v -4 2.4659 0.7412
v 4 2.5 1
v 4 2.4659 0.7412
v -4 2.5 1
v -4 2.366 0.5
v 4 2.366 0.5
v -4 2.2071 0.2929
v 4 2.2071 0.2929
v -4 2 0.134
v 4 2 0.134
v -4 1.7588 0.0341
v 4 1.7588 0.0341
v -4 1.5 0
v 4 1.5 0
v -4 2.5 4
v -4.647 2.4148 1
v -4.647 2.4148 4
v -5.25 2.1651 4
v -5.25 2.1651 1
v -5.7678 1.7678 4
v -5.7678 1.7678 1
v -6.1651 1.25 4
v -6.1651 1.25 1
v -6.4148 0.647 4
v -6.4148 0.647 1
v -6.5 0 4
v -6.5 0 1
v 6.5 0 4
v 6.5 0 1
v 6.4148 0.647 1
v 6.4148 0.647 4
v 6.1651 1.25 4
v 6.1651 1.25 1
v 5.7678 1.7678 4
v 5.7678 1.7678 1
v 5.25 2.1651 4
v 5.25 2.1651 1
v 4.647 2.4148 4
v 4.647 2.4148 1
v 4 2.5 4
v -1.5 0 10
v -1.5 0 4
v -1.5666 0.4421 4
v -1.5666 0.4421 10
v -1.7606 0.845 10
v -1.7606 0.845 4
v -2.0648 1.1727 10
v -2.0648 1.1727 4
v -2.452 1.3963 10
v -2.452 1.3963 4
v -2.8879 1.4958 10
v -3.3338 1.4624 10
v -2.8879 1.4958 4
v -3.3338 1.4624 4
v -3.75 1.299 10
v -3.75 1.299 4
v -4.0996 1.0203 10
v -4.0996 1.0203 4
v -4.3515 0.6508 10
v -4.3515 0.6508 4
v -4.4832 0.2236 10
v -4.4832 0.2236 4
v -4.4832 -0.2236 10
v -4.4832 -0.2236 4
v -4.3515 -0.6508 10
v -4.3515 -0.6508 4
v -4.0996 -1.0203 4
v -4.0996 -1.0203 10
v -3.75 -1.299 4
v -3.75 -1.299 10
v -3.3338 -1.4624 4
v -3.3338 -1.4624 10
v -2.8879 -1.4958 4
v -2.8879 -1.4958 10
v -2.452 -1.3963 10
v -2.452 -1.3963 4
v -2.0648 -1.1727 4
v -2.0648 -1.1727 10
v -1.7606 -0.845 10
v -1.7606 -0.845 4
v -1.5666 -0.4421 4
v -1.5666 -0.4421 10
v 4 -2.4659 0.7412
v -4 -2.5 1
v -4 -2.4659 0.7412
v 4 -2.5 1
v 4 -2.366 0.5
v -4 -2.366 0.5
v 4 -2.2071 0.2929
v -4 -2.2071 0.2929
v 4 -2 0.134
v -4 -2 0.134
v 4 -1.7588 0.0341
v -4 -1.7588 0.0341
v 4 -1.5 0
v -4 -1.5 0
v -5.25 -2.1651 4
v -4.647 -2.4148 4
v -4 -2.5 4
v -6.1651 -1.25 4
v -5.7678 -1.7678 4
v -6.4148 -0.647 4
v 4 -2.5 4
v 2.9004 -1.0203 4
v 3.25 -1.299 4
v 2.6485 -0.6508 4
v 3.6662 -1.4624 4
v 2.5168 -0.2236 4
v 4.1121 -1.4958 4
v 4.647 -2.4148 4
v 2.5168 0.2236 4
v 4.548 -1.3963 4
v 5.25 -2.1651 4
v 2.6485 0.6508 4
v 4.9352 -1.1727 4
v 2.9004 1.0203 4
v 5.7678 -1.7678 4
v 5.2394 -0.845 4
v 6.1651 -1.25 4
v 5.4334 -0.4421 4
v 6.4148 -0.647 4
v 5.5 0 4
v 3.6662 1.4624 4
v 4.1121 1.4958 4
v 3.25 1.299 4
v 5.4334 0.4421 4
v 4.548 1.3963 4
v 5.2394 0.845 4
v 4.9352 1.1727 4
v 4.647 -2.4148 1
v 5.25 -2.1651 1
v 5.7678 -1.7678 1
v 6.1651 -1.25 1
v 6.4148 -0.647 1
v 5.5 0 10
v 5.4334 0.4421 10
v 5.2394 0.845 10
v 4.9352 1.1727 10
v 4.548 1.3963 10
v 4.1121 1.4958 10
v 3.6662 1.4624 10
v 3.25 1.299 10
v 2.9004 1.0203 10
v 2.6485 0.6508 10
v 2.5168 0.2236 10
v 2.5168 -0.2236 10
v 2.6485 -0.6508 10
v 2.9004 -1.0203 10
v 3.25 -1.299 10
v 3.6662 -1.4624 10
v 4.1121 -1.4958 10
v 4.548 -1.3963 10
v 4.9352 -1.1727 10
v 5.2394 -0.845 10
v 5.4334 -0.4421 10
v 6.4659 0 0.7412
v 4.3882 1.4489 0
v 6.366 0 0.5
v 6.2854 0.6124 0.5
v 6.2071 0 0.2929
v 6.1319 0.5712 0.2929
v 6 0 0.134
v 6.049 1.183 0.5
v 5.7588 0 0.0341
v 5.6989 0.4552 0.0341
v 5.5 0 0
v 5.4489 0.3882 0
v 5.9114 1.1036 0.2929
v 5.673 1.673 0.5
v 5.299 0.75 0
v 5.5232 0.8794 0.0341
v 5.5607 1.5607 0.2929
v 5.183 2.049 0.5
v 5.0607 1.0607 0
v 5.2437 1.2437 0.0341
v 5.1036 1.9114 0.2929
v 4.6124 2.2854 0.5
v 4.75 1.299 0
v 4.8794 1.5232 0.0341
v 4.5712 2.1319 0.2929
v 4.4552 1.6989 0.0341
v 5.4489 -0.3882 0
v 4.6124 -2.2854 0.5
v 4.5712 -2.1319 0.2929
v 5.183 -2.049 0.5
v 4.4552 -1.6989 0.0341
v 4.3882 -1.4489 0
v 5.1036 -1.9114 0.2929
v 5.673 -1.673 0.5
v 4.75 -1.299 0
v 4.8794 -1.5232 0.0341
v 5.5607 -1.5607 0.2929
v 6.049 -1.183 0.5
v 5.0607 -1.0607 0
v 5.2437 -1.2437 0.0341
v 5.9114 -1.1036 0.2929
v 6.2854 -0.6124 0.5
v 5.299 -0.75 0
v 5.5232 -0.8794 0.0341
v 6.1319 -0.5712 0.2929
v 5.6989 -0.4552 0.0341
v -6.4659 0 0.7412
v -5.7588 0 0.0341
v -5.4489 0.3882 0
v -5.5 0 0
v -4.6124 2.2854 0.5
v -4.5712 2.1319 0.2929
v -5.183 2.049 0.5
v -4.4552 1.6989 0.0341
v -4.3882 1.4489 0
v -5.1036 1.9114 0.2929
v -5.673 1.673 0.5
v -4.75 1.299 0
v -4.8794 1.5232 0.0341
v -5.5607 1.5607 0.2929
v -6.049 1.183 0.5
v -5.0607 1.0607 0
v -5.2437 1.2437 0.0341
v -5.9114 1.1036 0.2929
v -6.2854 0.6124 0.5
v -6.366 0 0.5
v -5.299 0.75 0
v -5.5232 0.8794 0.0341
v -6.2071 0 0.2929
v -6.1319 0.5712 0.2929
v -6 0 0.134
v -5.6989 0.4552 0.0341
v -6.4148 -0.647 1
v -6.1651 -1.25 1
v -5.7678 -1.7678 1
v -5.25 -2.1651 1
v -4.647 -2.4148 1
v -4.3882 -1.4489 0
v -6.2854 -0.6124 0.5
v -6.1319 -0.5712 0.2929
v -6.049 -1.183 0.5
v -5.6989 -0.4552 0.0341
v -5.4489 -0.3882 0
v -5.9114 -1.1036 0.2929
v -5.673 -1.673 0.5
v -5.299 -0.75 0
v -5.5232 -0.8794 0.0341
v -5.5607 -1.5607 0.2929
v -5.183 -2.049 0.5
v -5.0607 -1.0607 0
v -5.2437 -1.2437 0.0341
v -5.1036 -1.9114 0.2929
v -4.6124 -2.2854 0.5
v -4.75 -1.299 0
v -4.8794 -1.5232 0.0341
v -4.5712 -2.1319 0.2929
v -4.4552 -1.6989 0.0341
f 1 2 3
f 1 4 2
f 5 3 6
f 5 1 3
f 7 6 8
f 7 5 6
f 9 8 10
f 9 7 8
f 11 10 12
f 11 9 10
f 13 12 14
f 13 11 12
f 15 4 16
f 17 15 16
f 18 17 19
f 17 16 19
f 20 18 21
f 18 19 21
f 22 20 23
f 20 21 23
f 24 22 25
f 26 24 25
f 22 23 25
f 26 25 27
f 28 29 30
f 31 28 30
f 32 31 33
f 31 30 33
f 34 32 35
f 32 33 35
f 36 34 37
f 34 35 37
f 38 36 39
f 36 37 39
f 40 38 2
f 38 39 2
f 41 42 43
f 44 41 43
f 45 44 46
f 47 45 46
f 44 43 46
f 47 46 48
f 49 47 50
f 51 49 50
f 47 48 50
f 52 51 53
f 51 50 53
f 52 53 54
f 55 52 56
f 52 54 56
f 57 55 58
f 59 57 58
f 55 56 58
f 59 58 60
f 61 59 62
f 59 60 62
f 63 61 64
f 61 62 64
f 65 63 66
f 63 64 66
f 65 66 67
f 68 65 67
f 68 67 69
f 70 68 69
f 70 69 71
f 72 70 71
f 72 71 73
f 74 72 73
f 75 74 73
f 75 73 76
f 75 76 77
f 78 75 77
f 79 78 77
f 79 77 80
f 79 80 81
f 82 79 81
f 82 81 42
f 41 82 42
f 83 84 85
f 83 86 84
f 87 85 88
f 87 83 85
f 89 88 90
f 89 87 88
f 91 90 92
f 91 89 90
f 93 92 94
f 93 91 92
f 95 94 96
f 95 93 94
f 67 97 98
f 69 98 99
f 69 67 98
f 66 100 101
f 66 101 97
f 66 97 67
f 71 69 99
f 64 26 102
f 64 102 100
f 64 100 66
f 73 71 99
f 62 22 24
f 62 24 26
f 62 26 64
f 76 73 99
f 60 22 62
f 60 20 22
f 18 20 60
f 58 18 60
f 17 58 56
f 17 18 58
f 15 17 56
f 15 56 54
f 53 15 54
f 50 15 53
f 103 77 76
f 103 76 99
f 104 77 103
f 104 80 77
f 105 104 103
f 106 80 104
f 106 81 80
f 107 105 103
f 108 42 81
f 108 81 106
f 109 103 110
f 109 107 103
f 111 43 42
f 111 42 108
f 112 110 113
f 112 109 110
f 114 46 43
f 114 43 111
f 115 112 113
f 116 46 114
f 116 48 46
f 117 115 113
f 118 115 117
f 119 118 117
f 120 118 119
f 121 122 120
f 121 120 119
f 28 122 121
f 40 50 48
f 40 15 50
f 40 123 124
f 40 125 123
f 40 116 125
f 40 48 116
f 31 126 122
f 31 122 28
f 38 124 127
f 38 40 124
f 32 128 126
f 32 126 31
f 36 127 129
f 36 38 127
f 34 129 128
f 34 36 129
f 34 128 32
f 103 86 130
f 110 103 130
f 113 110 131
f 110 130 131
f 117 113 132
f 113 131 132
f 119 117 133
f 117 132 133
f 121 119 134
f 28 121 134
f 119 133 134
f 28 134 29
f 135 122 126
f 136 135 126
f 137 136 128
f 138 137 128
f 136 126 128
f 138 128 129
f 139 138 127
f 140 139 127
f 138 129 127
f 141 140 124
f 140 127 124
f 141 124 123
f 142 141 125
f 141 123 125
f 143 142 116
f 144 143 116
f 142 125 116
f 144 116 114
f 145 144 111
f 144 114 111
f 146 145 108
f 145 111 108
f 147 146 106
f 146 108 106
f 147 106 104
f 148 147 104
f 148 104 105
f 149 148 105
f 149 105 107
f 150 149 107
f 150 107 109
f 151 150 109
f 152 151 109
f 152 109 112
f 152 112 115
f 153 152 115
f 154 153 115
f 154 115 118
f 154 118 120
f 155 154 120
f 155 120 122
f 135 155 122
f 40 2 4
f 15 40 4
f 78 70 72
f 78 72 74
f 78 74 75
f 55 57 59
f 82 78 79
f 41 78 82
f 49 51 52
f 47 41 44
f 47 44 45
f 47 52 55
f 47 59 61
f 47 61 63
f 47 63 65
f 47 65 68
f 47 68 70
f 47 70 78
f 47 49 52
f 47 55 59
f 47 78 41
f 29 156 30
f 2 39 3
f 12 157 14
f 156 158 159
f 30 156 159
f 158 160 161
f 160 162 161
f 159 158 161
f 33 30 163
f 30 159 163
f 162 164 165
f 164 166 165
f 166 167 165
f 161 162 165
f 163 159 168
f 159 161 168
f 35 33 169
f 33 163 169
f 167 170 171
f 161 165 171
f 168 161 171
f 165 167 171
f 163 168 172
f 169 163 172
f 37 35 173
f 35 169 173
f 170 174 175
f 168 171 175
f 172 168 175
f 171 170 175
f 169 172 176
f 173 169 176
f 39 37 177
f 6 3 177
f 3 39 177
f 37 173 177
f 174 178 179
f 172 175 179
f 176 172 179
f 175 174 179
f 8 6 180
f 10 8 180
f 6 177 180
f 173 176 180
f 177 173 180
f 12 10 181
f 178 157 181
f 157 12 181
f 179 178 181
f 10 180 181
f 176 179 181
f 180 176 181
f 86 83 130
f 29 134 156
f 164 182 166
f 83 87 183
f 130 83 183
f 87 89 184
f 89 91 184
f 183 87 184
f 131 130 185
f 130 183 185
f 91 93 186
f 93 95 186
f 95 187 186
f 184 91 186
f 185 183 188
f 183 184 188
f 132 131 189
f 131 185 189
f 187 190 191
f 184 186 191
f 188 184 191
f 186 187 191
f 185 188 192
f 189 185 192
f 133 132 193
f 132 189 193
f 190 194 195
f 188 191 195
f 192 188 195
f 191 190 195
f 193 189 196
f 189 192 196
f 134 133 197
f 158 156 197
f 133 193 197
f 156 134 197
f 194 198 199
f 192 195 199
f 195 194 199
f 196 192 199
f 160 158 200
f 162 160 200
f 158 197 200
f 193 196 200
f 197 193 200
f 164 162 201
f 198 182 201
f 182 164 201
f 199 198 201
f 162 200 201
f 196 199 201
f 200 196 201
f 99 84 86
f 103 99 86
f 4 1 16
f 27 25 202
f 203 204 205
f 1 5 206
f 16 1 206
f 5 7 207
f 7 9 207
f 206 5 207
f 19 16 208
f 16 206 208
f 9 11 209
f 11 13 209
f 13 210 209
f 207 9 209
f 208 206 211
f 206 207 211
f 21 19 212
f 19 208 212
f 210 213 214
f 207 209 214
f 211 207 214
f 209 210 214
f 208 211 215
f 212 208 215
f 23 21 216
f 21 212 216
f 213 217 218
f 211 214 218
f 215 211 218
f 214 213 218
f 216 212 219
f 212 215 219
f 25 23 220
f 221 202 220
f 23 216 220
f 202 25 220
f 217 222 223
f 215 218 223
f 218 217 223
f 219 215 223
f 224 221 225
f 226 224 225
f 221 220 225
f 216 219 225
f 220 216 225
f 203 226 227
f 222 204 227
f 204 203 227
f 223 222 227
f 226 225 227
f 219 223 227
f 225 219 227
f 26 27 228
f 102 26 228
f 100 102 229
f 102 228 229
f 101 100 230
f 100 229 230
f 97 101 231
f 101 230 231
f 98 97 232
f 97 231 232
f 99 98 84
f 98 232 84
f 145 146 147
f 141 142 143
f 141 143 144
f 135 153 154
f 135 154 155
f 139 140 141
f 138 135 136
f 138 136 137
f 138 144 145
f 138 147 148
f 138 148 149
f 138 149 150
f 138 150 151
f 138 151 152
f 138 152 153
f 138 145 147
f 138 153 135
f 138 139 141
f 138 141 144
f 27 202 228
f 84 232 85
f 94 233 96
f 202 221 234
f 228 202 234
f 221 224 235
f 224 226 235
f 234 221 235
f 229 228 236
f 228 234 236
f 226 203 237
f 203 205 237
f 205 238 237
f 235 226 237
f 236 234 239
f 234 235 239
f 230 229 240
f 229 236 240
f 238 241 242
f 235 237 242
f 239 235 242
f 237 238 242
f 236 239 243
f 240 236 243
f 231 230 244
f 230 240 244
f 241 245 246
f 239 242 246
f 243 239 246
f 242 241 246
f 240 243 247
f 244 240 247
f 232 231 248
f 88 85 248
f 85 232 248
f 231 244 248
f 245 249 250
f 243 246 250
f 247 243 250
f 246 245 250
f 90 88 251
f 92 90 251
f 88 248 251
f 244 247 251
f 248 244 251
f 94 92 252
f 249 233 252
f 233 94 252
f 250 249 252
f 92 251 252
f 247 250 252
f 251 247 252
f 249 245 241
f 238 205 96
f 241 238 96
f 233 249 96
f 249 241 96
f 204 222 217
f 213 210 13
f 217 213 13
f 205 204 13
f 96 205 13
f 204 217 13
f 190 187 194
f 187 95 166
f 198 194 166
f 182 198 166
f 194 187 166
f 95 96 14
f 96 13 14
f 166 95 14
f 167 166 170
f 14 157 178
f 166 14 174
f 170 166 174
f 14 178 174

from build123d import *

# Parameters (mm, degrees)
F0_R     = 1.5
F1_DEPTH = 10
F2_DEPTH = 4
F3_R     = 1


with BuildPart() as f1:
    # F0 (on Top) → F1 (new body)
    with BuildSketch(Plane.XY):
        with Locations((4, 0)):
            Circle(F0_R)
    extrude(amount=F1_DEPTH)



with BuildPart() as f1b:
    # F0 (on Top) → F1, piece 2 (new body)
    with BuildSketch(Plane.XY):
        with Locations((-3, 0)):
            Circle(F0_R)
    extrude(amount=F1_DEPTH)


with BuildPart() as f1_1:
    add(f1.part)

    add(f1b.part)  # F2 merges F1b
    # F0 (on Top) → F2 (join)
    with BuildSketch(Plane.XY):
        with BuildLine():
            Line((4, 2.5), (-4, 2.5))
            ThreePointArc((-4, 2.5), (-5.767766953, 1.767766953), (-6.5, 0))
            ThreePointArc((-6.5, 0), (-5.767766953, -1.767766953), (-4, -2.5))
            Line((-4, -2.5), (4, -2.5))
            ThreePointArc((4, -2.5), (5.767766953, -1.767766953), (6.5, 0))
            ThreePointArc((6.5, 0), (5.767766953, 1.767766953), (4, 2.5))
        make_face()
        with Locations((-3, 0)):
            Circle(F0_R, mode=Mode.SUBTRACT)
        with Locations((4, 0)):
            Circle(F0_R, mode=Mode.SUBTRACT)
    extrude(amount=F2_DEPTH)

    # F3
    f3_edges = [f1_1.edges().sort_by_distance(p)[0] for p in [
        (0, 2.5, 0),
        (-6.5, 0, 0),
    ]]
    fillet(f3_edges, radius=F3_R)


solid = f1_1.part
